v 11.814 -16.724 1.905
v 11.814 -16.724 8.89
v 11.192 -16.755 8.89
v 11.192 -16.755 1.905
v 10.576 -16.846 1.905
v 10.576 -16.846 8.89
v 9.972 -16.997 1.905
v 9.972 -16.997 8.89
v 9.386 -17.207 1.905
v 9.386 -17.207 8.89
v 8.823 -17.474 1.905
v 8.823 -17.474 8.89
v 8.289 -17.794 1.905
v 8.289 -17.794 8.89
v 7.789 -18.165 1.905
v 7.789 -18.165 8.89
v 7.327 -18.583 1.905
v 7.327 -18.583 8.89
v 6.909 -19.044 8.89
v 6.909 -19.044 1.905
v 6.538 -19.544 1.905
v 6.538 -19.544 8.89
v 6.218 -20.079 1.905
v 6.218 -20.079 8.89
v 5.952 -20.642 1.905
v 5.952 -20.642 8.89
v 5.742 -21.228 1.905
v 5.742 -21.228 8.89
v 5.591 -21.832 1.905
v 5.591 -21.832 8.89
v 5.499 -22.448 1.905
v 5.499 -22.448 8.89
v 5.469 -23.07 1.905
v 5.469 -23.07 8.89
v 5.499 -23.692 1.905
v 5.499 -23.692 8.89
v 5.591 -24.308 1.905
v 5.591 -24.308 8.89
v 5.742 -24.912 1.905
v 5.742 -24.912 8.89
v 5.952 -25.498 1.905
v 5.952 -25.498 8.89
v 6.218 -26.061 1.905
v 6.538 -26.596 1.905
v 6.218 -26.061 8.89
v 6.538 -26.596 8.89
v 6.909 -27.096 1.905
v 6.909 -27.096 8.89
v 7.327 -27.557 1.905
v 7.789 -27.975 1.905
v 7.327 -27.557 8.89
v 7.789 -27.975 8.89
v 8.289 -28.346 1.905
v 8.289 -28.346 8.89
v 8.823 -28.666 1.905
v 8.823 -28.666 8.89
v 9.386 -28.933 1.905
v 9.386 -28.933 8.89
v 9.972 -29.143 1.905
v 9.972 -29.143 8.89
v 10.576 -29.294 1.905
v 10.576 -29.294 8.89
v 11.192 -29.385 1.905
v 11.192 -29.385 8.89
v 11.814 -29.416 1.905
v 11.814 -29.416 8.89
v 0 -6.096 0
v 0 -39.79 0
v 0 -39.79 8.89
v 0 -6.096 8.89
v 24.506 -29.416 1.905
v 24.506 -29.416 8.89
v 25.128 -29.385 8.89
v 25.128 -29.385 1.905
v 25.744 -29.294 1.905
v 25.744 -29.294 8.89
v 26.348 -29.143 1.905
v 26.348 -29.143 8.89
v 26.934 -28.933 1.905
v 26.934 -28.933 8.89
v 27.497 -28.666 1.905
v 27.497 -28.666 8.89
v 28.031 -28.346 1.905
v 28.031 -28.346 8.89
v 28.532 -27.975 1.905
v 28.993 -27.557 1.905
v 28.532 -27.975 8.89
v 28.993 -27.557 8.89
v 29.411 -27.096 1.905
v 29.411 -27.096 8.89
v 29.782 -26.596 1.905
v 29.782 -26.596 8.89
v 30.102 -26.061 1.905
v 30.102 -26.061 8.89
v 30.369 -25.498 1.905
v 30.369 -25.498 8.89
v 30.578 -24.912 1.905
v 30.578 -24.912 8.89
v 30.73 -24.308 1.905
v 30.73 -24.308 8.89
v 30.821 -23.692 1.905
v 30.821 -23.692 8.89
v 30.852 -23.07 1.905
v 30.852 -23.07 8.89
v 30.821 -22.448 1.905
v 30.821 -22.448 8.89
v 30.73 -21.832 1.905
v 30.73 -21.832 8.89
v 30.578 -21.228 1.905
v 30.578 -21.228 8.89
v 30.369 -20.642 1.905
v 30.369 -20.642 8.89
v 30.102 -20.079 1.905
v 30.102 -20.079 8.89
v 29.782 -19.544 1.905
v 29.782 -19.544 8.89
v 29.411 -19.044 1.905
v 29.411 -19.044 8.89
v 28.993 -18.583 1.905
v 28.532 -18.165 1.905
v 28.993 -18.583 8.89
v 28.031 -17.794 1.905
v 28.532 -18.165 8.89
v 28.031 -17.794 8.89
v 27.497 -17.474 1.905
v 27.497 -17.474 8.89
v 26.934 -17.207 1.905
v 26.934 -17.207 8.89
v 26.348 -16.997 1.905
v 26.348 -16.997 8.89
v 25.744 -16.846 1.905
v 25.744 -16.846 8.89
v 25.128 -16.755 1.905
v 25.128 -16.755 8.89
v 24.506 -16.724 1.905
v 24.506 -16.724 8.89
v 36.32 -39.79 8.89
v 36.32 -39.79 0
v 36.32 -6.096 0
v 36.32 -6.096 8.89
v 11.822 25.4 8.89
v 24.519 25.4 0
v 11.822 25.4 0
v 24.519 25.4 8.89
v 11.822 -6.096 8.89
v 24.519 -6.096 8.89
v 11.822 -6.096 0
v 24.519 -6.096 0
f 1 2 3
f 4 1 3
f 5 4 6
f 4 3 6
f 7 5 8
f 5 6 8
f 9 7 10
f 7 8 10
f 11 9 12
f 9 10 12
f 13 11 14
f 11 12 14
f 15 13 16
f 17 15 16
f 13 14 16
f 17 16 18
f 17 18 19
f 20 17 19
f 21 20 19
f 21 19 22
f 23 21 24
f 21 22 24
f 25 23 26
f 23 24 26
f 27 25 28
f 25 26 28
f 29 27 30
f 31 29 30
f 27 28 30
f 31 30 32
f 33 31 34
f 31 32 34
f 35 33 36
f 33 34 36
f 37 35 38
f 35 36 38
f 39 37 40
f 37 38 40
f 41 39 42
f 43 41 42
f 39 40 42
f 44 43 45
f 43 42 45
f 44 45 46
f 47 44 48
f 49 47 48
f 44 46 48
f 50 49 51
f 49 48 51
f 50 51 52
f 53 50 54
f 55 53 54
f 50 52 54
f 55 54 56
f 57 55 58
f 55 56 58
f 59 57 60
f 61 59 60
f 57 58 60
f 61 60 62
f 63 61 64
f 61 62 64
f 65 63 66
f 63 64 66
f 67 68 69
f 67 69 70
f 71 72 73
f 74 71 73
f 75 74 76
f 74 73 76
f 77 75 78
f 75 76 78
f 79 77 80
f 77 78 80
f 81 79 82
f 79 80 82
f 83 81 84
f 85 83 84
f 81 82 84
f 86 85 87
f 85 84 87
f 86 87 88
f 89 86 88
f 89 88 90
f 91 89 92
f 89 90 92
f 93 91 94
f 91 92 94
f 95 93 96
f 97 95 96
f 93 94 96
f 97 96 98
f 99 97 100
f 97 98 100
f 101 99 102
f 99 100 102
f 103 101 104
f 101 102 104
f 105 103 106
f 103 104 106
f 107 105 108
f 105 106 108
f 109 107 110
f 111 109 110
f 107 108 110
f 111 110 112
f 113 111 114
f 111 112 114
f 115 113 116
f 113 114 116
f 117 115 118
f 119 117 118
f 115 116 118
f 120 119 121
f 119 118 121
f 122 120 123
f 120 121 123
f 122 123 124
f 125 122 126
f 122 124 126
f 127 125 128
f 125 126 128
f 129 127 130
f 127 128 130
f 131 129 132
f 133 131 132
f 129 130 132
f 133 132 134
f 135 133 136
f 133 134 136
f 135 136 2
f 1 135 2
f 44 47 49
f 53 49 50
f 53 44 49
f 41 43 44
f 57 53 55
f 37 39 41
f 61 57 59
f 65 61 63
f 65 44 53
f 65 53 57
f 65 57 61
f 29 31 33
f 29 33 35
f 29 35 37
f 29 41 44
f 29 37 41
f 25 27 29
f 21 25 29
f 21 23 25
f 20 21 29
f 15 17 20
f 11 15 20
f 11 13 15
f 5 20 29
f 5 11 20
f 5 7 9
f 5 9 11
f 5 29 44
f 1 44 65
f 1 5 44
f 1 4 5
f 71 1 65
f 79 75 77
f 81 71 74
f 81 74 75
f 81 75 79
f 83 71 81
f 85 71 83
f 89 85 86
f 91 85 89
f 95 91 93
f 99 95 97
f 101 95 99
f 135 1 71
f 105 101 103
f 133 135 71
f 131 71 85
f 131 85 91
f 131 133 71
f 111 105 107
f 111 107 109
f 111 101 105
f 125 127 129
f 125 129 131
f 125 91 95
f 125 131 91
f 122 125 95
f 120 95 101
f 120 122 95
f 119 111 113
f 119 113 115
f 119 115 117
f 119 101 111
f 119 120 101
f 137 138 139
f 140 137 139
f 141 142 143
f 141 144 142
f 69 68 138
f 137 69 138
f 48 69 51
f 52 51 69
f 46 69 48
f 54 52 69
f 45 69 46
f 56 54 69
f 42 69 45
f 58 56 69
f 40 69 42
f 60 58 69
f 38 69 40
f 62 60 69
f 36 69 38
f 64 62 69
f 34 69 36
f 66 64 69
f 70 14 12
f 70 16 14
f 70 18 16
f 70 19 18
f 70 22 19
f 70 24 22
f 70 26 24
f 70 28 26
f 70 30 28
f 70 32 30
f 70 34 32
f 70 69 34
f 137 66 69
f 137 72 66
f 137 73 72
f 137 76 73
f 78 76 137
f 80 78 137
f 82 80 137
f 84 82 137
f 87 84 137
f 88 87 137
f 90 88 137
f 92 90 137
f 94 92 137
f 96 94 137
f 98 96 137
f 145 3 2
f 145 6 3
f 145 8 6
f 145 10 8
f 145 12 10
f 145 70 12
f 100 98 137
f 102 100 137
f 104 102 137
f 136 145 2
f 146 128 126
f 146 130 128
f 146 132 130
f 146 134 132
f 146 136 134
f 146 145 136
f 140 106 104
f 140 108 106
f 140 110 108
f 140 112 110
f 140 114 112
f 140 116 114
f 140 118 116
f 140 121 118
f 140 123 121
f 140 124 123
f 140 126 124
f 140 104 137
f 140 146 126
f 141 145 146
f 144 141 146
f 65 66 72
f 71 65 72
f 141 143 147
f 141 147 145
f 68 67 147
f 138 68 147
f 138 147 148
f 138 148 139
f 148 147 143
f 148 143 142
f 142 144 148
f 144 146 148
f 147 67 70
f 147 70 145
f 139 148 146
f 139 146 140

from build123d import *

# Parameters (mm, degrees)
F0_W     = 36.3202914596
F0_H     = 46.1400337517
F1_DEPTH = 8.89
F3_DEPTH = 6.985
F5_DEPTH = 25.4
F6_DEPTH = 6.35
F7_DEPTH = 6.096


with BuildPart() as f1:
    # F0 (on Top) → F1 (new body)
    with BuildSketch(Plane.XY):
        with Locations((18.1601457298, -23.0700168759)):
            Rectangle(F0_W, F0_H)
    extrude(amount=F1_DEPTH)

    # F2 (on face) → F3 (cut)
    with BuildSketch(Plane.XY.offset(8.89)):
        with BuildLine():
            Line((11.814377988, -29.4157846176), (24.5059134716, -29.4157846176))
            ThreePointArc((24.5059134716, -29.4157846176), (30.8516812133, -23.0700168759), (24.5059134716, -16.7242491341))
            Line((24.5059134716, -16.7242491341), (11.814377988, -16.7242491341))
            ThreePointArc((11.814377988, -16.7242491341), (5.4686102462, -23.0700168759), (11.814377988, -29.4157846176))
        make_face()
    extrude(amount=-F3_DEPTH, mode=Mode.SUBTRACT)

    # F4 (on face) → F5 (join)
    with BuildSketch(Plane(origin=(0, 0, 0), x_dir=(-1, 0, 0), z_dir=(0, 1, 0))):
        Polygon((-24.5190151036, 0), (-11.8220960721, 0), (-11.8220960721, 4.445), (-11.8220960721, 8.89), (-24.5190151036, 8.89), (-24.5190151036, 4.445), align=None)
    extrude(amount=F5_DEPTH)

    # F6 (cut): a face of the model
    f6_faces = [f1.faces().sort_by_distance(p)[0] for p in [
        (18.1601457298, -46.1400337517, 4.445),
    ]]
    extrude(f6_faces, amount=-F6_DEPTH, mode=Mode.SUBTRACT)

    # F7 (cut): faces of the model
    f7_faces = [f1.faces().sort_by_distance(p)[0] for p in [
        (5.9110480361, 0, 4.445),
        (30.4196532816, 0, 4.445),
    ]]
    extrude(f7_faces, amount=-F7_DEPTH, mode=Mode.SUBTRACT)


solid = f1.part
